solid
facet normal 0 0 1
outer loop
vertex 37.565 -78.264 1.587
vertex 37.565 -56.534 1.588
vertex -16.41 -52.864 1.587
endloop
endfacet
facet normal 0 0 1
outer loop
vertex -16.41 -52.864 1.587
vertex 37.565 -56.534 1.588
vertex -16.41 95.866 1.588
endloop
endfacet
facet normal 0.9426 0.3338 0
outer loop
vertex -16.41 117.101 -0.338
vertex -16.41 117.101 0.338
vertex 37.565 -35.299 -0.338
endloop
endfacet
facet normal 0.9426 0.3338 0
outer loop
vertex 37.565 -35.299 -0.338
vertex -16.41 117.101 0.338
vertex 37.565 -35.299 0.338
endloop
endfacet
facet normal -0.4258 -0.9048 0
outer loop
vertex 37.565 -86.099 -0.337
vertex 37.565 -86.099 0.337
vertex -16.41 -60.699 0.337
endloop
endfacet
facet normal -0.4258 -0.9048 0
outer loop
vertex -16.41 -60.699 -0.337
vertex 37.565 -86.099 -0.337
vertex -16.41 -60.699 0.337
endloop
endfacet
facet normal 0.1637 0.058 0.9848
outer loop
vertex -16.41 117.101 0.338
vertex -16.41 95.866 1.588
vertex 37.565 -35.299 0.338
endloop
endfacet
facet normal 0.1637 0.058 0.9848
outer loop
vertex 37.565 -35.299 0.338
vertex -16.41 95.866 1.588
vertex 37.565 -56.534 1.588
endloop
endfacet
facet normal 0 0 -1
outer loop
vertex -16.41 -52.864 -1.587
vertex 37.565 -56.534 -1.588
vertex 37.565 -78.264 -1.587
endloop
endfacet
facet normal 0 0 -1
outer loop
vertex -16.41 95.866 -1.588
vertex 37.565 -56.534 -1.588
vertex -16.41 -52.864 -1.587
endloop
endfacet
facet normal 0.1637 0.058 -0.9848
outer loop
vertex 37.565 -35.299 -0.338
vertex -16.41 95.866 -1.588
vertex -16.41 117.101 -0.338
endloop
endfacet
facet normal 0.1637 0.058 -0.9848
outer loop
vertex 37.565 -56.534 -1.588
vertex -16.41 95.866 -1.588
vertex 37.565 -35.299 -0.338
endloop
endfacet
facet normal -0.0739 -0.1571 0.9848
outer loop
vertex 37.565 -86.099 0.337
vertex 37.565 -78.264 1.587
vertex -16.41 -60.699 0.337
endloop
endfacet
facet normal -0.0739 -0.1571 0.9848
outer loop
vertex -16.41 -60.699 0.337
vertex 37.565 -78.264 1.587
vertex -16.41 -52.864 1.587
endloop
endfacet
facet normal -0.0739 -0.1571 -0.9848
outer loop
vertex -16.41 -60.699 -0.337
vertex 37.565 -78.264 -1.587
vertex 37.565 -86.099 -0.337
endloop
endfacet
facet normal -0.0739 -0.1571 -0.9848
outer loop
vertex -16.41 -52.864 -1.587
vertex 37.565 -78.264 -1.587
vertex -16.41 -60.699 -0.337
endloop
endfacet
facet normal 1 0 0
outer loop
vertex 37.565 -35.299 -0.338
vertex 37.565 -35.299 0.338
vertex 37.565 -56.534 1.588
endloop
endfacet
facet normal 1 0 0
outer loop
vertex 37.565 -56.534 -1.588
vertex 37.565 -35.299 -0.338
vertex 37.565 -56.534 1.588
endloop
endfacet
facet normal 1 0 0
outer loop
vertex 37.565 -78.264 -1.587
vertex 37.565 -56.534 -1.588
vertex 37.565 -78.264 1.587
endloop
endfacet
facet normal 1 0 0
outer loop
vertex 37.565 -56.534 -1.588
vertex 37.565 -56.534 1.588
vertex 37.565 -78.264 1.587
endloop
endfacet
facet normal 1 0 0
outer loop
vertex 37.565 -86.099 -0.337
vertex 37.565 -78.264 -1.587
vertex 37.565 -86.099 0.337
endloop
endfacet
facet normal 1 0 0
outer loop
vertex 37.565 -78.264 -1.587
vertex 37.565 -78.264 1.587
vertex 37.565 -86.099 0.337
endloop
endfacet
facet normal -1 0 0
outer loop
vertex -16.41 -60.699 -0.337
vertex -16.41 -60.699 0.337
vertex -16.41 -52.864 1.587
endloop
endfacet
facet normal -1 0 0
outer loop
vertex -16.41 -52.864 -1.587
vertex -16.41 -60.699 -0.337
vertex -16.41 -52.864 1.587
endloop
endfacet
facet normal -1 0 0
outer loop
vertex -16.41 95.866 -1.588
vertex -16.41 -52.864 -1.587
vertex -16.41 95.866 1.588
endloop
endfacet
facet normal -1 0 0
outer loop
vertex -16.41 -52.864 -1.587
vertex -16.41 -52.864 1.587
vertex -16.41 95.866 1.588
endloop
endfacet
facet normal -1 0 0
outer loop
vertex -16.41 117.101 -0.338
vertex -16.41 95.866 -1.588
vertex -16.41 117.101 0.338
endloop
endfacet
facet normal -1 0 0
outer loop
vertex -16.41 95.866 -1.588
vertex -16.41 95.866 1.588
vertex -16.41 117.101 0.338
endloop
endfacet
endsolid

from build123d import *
from OCP.BRepFilletAPI import BRepFilletAPI_MakeChamfer

# Parameters (mm, degrees)
BOSS_EXTRUDE1_DEPTH = 1.5875
CHAMFER1_SIZE       = 1.25
CHAMFER1_SIZE2      = 7.089102275


with BuildPart() as part:
    # Sketch1 → Boss-Extrude1 (new, symmetric)
    with BuildSketch(Plane.XY):
        Polygon((-16.410036231, -60.699177334), (-16.410036231, 117.100822666), (37.564963769, -35.299177334), (37.564963769, -86.099177334), align=None)
    extrude(amount=BOSS_EXTRUDE1_DEPTH, both=True)

    # Chamfer1: one chamfer whose edges measure the first distance from different faces: ONE call of the kernel's chamfer builder (chamfer() names one face for all edges)
    chamfer1_edges_1 = [part.edges().sort_by_distance(p)[0] for p in [
        (10.577463769, 40.900822666, 1.5875),
        (10.577463769, 40.900822666, -1.5875),
    ]]
    chamfer1_side_1 = [part.faces().sort_by_distance(p)[0] for p in [
        (10.577463769, 40.900822666, 0),
    ]]
    chamfer1_edges_2 = [part.edges().sort_by_distance(p)[0] for p in [
        (10.577463769, -73.399177334, 1.5875),
        (10.577463769, -73.399177334, -1.5875),
    ]]
    chamfer1_side_2 = [part.faces().sort_by_distance(p)[0] for p in [
        (10.577463769, -73.399177334, 0),
    ]]
    chamfer1 = BRepFilletAPI_MakeChamfer(part.part.solid().wrapped)
    for e in chamfer1_edges_1:
        chamfer1.Add(CHAMFER1_SIZE, CHAMFER1_SIZE2, e.wrapped, chamfer1_side_1[0].wrapped)  # the first distance lies on this face
    for e in chamfer1_edges_2:
        chamfer1.Add(CHAMFER1_SIZE, CHAMFER1_SIZE2, e.wrapped, chamfer1_side_2[0].wrapped)  # the first distance lies on this face
    add(Compound.cast(chamfer1.Shape()), mode=Mode.REPLACE)


solid = part.part
